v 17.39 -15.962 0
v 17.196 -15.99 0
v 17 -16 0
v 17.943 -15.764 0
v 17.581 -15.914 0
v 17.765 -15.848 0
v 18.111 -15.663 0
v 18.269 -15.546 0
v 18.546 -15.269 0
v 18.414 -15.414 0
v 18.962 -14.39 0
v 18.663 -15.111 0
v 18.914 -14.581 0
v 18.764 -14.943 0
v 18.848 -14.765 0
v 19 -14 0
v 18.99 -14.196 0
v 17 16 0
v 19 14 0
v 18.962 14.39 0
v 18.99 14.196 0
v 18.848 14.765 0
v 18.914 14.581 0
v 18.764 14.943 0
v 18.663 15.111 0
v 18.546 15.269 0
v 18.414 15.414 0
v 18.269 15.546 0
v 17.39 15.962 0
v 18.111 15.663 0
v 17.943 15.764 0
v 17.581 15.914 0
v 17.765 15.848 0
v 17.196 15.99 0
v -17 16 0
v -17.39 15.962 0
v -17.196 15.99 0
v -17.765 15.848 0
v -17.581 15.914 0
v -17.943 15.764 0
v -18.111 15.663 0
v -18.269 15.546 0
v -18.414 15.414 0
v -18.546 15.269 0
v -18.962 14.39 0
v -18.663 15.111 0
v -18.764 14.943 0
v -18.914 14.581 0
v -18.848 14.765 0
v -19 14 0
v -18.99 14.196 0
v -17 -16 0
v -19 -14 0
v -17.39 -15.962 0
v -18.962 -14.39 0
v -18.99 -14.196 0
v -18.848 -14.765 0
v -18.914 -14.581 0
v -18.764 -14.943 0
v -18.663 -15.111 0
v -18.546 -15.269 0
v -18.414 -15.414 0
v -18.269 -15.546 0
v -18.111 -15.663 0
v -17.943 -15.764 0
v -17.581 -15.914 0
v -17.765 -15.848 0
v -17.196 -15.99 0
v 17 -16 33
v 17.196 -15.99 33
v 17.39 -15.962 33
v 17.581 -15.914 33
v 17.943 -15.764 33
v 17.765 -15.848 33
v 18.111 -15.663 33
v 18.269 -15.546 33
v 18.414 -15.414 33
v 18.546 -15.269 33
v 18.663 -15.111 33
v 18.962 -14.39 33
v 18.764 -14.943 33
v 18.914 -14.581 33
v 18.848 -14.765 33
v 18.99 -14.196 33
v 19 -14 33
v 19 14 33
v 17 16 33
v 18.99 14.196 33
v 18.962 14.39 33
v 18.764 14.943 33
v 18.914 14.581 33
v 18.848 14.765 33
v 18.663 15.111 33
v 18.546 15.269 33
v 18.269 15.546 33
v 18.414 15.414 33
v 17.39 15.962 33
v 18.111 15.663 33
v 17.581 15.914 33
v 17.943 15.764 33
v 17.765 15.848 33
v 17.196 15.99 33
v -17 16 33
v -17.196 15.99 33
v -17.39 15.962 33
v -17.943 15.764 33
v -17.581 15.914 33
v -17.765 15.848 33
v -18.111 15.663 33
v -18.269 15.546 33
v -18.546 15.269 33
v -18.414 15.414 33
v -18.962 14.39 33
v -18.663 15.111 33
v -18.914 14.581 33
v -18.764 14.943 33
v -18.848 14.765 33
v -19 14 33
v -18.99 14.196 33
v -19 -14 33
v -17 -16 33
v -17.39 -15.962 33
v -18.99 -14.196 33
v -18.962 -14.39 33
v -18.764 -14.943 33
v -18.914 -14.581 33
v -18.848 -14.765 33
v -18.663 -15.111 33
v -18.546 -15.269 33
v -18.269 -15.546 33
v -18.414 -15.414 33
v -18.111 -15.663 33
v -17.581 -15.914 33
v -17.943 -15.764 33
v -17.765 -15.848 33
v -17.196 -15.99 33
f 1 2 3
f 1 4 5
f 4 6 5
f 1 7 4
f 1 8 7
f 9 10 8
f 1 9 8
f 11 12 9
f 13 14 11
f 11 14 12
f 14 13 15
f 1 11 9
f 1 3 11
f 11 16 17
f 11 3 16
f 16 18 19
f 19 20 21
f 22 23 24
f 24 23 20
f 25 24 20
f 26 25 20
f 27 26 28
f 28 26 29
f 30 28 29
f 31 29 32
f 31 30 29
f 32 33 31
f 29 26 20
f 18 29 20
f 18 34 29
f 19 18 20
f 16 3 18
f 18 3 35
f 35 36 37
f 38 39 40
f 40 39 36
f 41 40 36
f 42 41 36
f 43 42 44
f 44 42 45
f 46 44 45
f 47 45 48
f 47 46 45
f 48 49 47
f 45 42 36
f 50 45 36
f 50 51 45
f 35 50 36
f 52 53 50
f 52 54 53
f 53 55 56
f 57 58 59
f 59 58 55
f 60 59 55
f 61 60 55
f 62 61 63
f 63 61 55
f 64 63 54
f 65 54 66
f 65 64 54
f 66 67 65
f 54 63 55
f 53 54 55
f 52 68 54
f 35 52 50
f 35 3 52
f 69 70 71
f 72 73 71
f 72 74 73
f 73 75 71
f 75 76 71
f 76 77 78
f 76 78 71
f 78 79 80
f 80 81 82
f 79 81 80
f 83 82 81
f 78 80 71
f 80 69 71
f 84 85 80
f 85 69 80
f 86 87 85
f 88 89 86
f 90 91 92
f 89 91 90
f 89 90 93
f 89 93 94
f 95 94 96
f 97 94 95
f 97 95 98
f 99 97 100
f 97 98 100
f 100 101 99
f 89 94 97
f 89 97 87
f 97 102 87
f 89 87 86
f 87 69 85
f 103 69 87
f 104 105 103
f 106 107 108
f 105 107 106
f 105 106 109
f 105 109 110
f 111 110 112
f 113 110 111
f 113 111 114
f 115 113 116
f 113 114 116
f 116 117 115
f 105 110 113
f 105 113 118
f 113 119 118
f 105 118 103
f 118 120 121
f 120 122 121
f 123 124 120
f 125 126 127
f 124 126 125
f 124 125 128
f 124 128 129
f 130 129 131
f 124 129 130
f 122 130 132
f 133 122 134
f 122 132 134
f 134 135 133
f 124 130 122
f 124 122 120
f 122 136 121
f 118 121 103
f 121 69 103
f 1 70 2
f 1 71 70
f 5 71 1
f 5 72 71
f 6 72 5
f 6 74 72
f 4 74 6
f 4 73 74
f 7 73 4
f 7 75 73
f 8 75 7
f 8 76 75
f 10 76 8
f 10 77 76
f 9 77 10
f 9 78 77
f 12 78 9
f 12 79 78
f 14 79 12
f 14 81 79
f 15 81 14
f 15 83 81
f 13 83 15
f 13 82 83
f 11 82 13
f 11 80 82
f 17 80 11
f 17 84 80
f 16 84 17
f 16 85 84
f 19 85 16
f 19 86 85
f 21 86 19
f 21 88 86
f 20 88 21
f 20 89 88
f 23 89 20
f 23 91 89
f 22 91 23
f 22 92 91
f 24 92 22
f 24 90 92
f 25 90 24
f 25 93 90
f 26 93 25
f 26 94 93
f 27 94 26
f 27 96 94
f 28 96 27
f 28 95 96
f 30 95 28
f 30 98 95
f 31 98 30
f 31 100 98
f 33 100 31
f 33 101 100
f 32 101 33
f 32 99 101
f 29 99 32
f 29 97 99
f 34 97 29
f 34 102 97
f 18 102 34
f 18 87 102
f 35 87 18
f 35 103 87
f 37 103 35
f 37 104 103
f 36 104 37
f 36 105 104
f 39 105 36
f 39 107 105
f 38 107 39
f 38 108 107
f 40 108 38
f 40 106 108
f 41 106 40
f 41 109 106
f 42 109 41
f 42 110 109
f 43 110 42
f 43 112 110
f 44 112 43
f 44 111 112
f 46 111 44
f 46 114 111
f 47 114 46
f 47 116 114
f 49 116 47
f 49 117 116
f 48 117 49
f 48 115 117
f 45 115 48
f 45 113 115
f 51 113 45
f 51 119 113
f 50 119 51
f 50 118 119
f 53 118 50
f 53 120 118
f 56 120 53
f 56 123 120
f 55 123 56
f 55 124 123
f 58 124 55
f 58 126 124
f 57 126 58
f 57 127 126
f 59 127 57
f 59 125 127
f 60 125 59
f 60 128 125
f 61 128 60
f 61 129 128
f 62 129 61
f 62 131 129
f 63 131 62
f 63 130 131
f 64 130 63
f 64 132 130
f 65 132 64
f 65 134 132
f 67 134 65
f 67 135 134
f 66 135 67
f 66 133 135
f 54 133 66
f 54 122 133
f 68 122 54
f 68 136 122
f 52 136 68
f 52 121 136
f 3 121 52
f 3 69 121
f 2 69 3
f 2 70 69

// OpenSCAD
$fn = 64;

module mains_transformer(size=[38.0, 32.0, 33.0], corner_r=2.0) {
    x = size[0];
    y = size[1];
    z = size[2];
    r = min(corner_r, min(x,y)/2);

    // Rounded rectangular prism
    linear_extrude(height=z)
        offset(r=r)
            square([x-2*r, y-2*r], center=true);
}

mains_transformer();
